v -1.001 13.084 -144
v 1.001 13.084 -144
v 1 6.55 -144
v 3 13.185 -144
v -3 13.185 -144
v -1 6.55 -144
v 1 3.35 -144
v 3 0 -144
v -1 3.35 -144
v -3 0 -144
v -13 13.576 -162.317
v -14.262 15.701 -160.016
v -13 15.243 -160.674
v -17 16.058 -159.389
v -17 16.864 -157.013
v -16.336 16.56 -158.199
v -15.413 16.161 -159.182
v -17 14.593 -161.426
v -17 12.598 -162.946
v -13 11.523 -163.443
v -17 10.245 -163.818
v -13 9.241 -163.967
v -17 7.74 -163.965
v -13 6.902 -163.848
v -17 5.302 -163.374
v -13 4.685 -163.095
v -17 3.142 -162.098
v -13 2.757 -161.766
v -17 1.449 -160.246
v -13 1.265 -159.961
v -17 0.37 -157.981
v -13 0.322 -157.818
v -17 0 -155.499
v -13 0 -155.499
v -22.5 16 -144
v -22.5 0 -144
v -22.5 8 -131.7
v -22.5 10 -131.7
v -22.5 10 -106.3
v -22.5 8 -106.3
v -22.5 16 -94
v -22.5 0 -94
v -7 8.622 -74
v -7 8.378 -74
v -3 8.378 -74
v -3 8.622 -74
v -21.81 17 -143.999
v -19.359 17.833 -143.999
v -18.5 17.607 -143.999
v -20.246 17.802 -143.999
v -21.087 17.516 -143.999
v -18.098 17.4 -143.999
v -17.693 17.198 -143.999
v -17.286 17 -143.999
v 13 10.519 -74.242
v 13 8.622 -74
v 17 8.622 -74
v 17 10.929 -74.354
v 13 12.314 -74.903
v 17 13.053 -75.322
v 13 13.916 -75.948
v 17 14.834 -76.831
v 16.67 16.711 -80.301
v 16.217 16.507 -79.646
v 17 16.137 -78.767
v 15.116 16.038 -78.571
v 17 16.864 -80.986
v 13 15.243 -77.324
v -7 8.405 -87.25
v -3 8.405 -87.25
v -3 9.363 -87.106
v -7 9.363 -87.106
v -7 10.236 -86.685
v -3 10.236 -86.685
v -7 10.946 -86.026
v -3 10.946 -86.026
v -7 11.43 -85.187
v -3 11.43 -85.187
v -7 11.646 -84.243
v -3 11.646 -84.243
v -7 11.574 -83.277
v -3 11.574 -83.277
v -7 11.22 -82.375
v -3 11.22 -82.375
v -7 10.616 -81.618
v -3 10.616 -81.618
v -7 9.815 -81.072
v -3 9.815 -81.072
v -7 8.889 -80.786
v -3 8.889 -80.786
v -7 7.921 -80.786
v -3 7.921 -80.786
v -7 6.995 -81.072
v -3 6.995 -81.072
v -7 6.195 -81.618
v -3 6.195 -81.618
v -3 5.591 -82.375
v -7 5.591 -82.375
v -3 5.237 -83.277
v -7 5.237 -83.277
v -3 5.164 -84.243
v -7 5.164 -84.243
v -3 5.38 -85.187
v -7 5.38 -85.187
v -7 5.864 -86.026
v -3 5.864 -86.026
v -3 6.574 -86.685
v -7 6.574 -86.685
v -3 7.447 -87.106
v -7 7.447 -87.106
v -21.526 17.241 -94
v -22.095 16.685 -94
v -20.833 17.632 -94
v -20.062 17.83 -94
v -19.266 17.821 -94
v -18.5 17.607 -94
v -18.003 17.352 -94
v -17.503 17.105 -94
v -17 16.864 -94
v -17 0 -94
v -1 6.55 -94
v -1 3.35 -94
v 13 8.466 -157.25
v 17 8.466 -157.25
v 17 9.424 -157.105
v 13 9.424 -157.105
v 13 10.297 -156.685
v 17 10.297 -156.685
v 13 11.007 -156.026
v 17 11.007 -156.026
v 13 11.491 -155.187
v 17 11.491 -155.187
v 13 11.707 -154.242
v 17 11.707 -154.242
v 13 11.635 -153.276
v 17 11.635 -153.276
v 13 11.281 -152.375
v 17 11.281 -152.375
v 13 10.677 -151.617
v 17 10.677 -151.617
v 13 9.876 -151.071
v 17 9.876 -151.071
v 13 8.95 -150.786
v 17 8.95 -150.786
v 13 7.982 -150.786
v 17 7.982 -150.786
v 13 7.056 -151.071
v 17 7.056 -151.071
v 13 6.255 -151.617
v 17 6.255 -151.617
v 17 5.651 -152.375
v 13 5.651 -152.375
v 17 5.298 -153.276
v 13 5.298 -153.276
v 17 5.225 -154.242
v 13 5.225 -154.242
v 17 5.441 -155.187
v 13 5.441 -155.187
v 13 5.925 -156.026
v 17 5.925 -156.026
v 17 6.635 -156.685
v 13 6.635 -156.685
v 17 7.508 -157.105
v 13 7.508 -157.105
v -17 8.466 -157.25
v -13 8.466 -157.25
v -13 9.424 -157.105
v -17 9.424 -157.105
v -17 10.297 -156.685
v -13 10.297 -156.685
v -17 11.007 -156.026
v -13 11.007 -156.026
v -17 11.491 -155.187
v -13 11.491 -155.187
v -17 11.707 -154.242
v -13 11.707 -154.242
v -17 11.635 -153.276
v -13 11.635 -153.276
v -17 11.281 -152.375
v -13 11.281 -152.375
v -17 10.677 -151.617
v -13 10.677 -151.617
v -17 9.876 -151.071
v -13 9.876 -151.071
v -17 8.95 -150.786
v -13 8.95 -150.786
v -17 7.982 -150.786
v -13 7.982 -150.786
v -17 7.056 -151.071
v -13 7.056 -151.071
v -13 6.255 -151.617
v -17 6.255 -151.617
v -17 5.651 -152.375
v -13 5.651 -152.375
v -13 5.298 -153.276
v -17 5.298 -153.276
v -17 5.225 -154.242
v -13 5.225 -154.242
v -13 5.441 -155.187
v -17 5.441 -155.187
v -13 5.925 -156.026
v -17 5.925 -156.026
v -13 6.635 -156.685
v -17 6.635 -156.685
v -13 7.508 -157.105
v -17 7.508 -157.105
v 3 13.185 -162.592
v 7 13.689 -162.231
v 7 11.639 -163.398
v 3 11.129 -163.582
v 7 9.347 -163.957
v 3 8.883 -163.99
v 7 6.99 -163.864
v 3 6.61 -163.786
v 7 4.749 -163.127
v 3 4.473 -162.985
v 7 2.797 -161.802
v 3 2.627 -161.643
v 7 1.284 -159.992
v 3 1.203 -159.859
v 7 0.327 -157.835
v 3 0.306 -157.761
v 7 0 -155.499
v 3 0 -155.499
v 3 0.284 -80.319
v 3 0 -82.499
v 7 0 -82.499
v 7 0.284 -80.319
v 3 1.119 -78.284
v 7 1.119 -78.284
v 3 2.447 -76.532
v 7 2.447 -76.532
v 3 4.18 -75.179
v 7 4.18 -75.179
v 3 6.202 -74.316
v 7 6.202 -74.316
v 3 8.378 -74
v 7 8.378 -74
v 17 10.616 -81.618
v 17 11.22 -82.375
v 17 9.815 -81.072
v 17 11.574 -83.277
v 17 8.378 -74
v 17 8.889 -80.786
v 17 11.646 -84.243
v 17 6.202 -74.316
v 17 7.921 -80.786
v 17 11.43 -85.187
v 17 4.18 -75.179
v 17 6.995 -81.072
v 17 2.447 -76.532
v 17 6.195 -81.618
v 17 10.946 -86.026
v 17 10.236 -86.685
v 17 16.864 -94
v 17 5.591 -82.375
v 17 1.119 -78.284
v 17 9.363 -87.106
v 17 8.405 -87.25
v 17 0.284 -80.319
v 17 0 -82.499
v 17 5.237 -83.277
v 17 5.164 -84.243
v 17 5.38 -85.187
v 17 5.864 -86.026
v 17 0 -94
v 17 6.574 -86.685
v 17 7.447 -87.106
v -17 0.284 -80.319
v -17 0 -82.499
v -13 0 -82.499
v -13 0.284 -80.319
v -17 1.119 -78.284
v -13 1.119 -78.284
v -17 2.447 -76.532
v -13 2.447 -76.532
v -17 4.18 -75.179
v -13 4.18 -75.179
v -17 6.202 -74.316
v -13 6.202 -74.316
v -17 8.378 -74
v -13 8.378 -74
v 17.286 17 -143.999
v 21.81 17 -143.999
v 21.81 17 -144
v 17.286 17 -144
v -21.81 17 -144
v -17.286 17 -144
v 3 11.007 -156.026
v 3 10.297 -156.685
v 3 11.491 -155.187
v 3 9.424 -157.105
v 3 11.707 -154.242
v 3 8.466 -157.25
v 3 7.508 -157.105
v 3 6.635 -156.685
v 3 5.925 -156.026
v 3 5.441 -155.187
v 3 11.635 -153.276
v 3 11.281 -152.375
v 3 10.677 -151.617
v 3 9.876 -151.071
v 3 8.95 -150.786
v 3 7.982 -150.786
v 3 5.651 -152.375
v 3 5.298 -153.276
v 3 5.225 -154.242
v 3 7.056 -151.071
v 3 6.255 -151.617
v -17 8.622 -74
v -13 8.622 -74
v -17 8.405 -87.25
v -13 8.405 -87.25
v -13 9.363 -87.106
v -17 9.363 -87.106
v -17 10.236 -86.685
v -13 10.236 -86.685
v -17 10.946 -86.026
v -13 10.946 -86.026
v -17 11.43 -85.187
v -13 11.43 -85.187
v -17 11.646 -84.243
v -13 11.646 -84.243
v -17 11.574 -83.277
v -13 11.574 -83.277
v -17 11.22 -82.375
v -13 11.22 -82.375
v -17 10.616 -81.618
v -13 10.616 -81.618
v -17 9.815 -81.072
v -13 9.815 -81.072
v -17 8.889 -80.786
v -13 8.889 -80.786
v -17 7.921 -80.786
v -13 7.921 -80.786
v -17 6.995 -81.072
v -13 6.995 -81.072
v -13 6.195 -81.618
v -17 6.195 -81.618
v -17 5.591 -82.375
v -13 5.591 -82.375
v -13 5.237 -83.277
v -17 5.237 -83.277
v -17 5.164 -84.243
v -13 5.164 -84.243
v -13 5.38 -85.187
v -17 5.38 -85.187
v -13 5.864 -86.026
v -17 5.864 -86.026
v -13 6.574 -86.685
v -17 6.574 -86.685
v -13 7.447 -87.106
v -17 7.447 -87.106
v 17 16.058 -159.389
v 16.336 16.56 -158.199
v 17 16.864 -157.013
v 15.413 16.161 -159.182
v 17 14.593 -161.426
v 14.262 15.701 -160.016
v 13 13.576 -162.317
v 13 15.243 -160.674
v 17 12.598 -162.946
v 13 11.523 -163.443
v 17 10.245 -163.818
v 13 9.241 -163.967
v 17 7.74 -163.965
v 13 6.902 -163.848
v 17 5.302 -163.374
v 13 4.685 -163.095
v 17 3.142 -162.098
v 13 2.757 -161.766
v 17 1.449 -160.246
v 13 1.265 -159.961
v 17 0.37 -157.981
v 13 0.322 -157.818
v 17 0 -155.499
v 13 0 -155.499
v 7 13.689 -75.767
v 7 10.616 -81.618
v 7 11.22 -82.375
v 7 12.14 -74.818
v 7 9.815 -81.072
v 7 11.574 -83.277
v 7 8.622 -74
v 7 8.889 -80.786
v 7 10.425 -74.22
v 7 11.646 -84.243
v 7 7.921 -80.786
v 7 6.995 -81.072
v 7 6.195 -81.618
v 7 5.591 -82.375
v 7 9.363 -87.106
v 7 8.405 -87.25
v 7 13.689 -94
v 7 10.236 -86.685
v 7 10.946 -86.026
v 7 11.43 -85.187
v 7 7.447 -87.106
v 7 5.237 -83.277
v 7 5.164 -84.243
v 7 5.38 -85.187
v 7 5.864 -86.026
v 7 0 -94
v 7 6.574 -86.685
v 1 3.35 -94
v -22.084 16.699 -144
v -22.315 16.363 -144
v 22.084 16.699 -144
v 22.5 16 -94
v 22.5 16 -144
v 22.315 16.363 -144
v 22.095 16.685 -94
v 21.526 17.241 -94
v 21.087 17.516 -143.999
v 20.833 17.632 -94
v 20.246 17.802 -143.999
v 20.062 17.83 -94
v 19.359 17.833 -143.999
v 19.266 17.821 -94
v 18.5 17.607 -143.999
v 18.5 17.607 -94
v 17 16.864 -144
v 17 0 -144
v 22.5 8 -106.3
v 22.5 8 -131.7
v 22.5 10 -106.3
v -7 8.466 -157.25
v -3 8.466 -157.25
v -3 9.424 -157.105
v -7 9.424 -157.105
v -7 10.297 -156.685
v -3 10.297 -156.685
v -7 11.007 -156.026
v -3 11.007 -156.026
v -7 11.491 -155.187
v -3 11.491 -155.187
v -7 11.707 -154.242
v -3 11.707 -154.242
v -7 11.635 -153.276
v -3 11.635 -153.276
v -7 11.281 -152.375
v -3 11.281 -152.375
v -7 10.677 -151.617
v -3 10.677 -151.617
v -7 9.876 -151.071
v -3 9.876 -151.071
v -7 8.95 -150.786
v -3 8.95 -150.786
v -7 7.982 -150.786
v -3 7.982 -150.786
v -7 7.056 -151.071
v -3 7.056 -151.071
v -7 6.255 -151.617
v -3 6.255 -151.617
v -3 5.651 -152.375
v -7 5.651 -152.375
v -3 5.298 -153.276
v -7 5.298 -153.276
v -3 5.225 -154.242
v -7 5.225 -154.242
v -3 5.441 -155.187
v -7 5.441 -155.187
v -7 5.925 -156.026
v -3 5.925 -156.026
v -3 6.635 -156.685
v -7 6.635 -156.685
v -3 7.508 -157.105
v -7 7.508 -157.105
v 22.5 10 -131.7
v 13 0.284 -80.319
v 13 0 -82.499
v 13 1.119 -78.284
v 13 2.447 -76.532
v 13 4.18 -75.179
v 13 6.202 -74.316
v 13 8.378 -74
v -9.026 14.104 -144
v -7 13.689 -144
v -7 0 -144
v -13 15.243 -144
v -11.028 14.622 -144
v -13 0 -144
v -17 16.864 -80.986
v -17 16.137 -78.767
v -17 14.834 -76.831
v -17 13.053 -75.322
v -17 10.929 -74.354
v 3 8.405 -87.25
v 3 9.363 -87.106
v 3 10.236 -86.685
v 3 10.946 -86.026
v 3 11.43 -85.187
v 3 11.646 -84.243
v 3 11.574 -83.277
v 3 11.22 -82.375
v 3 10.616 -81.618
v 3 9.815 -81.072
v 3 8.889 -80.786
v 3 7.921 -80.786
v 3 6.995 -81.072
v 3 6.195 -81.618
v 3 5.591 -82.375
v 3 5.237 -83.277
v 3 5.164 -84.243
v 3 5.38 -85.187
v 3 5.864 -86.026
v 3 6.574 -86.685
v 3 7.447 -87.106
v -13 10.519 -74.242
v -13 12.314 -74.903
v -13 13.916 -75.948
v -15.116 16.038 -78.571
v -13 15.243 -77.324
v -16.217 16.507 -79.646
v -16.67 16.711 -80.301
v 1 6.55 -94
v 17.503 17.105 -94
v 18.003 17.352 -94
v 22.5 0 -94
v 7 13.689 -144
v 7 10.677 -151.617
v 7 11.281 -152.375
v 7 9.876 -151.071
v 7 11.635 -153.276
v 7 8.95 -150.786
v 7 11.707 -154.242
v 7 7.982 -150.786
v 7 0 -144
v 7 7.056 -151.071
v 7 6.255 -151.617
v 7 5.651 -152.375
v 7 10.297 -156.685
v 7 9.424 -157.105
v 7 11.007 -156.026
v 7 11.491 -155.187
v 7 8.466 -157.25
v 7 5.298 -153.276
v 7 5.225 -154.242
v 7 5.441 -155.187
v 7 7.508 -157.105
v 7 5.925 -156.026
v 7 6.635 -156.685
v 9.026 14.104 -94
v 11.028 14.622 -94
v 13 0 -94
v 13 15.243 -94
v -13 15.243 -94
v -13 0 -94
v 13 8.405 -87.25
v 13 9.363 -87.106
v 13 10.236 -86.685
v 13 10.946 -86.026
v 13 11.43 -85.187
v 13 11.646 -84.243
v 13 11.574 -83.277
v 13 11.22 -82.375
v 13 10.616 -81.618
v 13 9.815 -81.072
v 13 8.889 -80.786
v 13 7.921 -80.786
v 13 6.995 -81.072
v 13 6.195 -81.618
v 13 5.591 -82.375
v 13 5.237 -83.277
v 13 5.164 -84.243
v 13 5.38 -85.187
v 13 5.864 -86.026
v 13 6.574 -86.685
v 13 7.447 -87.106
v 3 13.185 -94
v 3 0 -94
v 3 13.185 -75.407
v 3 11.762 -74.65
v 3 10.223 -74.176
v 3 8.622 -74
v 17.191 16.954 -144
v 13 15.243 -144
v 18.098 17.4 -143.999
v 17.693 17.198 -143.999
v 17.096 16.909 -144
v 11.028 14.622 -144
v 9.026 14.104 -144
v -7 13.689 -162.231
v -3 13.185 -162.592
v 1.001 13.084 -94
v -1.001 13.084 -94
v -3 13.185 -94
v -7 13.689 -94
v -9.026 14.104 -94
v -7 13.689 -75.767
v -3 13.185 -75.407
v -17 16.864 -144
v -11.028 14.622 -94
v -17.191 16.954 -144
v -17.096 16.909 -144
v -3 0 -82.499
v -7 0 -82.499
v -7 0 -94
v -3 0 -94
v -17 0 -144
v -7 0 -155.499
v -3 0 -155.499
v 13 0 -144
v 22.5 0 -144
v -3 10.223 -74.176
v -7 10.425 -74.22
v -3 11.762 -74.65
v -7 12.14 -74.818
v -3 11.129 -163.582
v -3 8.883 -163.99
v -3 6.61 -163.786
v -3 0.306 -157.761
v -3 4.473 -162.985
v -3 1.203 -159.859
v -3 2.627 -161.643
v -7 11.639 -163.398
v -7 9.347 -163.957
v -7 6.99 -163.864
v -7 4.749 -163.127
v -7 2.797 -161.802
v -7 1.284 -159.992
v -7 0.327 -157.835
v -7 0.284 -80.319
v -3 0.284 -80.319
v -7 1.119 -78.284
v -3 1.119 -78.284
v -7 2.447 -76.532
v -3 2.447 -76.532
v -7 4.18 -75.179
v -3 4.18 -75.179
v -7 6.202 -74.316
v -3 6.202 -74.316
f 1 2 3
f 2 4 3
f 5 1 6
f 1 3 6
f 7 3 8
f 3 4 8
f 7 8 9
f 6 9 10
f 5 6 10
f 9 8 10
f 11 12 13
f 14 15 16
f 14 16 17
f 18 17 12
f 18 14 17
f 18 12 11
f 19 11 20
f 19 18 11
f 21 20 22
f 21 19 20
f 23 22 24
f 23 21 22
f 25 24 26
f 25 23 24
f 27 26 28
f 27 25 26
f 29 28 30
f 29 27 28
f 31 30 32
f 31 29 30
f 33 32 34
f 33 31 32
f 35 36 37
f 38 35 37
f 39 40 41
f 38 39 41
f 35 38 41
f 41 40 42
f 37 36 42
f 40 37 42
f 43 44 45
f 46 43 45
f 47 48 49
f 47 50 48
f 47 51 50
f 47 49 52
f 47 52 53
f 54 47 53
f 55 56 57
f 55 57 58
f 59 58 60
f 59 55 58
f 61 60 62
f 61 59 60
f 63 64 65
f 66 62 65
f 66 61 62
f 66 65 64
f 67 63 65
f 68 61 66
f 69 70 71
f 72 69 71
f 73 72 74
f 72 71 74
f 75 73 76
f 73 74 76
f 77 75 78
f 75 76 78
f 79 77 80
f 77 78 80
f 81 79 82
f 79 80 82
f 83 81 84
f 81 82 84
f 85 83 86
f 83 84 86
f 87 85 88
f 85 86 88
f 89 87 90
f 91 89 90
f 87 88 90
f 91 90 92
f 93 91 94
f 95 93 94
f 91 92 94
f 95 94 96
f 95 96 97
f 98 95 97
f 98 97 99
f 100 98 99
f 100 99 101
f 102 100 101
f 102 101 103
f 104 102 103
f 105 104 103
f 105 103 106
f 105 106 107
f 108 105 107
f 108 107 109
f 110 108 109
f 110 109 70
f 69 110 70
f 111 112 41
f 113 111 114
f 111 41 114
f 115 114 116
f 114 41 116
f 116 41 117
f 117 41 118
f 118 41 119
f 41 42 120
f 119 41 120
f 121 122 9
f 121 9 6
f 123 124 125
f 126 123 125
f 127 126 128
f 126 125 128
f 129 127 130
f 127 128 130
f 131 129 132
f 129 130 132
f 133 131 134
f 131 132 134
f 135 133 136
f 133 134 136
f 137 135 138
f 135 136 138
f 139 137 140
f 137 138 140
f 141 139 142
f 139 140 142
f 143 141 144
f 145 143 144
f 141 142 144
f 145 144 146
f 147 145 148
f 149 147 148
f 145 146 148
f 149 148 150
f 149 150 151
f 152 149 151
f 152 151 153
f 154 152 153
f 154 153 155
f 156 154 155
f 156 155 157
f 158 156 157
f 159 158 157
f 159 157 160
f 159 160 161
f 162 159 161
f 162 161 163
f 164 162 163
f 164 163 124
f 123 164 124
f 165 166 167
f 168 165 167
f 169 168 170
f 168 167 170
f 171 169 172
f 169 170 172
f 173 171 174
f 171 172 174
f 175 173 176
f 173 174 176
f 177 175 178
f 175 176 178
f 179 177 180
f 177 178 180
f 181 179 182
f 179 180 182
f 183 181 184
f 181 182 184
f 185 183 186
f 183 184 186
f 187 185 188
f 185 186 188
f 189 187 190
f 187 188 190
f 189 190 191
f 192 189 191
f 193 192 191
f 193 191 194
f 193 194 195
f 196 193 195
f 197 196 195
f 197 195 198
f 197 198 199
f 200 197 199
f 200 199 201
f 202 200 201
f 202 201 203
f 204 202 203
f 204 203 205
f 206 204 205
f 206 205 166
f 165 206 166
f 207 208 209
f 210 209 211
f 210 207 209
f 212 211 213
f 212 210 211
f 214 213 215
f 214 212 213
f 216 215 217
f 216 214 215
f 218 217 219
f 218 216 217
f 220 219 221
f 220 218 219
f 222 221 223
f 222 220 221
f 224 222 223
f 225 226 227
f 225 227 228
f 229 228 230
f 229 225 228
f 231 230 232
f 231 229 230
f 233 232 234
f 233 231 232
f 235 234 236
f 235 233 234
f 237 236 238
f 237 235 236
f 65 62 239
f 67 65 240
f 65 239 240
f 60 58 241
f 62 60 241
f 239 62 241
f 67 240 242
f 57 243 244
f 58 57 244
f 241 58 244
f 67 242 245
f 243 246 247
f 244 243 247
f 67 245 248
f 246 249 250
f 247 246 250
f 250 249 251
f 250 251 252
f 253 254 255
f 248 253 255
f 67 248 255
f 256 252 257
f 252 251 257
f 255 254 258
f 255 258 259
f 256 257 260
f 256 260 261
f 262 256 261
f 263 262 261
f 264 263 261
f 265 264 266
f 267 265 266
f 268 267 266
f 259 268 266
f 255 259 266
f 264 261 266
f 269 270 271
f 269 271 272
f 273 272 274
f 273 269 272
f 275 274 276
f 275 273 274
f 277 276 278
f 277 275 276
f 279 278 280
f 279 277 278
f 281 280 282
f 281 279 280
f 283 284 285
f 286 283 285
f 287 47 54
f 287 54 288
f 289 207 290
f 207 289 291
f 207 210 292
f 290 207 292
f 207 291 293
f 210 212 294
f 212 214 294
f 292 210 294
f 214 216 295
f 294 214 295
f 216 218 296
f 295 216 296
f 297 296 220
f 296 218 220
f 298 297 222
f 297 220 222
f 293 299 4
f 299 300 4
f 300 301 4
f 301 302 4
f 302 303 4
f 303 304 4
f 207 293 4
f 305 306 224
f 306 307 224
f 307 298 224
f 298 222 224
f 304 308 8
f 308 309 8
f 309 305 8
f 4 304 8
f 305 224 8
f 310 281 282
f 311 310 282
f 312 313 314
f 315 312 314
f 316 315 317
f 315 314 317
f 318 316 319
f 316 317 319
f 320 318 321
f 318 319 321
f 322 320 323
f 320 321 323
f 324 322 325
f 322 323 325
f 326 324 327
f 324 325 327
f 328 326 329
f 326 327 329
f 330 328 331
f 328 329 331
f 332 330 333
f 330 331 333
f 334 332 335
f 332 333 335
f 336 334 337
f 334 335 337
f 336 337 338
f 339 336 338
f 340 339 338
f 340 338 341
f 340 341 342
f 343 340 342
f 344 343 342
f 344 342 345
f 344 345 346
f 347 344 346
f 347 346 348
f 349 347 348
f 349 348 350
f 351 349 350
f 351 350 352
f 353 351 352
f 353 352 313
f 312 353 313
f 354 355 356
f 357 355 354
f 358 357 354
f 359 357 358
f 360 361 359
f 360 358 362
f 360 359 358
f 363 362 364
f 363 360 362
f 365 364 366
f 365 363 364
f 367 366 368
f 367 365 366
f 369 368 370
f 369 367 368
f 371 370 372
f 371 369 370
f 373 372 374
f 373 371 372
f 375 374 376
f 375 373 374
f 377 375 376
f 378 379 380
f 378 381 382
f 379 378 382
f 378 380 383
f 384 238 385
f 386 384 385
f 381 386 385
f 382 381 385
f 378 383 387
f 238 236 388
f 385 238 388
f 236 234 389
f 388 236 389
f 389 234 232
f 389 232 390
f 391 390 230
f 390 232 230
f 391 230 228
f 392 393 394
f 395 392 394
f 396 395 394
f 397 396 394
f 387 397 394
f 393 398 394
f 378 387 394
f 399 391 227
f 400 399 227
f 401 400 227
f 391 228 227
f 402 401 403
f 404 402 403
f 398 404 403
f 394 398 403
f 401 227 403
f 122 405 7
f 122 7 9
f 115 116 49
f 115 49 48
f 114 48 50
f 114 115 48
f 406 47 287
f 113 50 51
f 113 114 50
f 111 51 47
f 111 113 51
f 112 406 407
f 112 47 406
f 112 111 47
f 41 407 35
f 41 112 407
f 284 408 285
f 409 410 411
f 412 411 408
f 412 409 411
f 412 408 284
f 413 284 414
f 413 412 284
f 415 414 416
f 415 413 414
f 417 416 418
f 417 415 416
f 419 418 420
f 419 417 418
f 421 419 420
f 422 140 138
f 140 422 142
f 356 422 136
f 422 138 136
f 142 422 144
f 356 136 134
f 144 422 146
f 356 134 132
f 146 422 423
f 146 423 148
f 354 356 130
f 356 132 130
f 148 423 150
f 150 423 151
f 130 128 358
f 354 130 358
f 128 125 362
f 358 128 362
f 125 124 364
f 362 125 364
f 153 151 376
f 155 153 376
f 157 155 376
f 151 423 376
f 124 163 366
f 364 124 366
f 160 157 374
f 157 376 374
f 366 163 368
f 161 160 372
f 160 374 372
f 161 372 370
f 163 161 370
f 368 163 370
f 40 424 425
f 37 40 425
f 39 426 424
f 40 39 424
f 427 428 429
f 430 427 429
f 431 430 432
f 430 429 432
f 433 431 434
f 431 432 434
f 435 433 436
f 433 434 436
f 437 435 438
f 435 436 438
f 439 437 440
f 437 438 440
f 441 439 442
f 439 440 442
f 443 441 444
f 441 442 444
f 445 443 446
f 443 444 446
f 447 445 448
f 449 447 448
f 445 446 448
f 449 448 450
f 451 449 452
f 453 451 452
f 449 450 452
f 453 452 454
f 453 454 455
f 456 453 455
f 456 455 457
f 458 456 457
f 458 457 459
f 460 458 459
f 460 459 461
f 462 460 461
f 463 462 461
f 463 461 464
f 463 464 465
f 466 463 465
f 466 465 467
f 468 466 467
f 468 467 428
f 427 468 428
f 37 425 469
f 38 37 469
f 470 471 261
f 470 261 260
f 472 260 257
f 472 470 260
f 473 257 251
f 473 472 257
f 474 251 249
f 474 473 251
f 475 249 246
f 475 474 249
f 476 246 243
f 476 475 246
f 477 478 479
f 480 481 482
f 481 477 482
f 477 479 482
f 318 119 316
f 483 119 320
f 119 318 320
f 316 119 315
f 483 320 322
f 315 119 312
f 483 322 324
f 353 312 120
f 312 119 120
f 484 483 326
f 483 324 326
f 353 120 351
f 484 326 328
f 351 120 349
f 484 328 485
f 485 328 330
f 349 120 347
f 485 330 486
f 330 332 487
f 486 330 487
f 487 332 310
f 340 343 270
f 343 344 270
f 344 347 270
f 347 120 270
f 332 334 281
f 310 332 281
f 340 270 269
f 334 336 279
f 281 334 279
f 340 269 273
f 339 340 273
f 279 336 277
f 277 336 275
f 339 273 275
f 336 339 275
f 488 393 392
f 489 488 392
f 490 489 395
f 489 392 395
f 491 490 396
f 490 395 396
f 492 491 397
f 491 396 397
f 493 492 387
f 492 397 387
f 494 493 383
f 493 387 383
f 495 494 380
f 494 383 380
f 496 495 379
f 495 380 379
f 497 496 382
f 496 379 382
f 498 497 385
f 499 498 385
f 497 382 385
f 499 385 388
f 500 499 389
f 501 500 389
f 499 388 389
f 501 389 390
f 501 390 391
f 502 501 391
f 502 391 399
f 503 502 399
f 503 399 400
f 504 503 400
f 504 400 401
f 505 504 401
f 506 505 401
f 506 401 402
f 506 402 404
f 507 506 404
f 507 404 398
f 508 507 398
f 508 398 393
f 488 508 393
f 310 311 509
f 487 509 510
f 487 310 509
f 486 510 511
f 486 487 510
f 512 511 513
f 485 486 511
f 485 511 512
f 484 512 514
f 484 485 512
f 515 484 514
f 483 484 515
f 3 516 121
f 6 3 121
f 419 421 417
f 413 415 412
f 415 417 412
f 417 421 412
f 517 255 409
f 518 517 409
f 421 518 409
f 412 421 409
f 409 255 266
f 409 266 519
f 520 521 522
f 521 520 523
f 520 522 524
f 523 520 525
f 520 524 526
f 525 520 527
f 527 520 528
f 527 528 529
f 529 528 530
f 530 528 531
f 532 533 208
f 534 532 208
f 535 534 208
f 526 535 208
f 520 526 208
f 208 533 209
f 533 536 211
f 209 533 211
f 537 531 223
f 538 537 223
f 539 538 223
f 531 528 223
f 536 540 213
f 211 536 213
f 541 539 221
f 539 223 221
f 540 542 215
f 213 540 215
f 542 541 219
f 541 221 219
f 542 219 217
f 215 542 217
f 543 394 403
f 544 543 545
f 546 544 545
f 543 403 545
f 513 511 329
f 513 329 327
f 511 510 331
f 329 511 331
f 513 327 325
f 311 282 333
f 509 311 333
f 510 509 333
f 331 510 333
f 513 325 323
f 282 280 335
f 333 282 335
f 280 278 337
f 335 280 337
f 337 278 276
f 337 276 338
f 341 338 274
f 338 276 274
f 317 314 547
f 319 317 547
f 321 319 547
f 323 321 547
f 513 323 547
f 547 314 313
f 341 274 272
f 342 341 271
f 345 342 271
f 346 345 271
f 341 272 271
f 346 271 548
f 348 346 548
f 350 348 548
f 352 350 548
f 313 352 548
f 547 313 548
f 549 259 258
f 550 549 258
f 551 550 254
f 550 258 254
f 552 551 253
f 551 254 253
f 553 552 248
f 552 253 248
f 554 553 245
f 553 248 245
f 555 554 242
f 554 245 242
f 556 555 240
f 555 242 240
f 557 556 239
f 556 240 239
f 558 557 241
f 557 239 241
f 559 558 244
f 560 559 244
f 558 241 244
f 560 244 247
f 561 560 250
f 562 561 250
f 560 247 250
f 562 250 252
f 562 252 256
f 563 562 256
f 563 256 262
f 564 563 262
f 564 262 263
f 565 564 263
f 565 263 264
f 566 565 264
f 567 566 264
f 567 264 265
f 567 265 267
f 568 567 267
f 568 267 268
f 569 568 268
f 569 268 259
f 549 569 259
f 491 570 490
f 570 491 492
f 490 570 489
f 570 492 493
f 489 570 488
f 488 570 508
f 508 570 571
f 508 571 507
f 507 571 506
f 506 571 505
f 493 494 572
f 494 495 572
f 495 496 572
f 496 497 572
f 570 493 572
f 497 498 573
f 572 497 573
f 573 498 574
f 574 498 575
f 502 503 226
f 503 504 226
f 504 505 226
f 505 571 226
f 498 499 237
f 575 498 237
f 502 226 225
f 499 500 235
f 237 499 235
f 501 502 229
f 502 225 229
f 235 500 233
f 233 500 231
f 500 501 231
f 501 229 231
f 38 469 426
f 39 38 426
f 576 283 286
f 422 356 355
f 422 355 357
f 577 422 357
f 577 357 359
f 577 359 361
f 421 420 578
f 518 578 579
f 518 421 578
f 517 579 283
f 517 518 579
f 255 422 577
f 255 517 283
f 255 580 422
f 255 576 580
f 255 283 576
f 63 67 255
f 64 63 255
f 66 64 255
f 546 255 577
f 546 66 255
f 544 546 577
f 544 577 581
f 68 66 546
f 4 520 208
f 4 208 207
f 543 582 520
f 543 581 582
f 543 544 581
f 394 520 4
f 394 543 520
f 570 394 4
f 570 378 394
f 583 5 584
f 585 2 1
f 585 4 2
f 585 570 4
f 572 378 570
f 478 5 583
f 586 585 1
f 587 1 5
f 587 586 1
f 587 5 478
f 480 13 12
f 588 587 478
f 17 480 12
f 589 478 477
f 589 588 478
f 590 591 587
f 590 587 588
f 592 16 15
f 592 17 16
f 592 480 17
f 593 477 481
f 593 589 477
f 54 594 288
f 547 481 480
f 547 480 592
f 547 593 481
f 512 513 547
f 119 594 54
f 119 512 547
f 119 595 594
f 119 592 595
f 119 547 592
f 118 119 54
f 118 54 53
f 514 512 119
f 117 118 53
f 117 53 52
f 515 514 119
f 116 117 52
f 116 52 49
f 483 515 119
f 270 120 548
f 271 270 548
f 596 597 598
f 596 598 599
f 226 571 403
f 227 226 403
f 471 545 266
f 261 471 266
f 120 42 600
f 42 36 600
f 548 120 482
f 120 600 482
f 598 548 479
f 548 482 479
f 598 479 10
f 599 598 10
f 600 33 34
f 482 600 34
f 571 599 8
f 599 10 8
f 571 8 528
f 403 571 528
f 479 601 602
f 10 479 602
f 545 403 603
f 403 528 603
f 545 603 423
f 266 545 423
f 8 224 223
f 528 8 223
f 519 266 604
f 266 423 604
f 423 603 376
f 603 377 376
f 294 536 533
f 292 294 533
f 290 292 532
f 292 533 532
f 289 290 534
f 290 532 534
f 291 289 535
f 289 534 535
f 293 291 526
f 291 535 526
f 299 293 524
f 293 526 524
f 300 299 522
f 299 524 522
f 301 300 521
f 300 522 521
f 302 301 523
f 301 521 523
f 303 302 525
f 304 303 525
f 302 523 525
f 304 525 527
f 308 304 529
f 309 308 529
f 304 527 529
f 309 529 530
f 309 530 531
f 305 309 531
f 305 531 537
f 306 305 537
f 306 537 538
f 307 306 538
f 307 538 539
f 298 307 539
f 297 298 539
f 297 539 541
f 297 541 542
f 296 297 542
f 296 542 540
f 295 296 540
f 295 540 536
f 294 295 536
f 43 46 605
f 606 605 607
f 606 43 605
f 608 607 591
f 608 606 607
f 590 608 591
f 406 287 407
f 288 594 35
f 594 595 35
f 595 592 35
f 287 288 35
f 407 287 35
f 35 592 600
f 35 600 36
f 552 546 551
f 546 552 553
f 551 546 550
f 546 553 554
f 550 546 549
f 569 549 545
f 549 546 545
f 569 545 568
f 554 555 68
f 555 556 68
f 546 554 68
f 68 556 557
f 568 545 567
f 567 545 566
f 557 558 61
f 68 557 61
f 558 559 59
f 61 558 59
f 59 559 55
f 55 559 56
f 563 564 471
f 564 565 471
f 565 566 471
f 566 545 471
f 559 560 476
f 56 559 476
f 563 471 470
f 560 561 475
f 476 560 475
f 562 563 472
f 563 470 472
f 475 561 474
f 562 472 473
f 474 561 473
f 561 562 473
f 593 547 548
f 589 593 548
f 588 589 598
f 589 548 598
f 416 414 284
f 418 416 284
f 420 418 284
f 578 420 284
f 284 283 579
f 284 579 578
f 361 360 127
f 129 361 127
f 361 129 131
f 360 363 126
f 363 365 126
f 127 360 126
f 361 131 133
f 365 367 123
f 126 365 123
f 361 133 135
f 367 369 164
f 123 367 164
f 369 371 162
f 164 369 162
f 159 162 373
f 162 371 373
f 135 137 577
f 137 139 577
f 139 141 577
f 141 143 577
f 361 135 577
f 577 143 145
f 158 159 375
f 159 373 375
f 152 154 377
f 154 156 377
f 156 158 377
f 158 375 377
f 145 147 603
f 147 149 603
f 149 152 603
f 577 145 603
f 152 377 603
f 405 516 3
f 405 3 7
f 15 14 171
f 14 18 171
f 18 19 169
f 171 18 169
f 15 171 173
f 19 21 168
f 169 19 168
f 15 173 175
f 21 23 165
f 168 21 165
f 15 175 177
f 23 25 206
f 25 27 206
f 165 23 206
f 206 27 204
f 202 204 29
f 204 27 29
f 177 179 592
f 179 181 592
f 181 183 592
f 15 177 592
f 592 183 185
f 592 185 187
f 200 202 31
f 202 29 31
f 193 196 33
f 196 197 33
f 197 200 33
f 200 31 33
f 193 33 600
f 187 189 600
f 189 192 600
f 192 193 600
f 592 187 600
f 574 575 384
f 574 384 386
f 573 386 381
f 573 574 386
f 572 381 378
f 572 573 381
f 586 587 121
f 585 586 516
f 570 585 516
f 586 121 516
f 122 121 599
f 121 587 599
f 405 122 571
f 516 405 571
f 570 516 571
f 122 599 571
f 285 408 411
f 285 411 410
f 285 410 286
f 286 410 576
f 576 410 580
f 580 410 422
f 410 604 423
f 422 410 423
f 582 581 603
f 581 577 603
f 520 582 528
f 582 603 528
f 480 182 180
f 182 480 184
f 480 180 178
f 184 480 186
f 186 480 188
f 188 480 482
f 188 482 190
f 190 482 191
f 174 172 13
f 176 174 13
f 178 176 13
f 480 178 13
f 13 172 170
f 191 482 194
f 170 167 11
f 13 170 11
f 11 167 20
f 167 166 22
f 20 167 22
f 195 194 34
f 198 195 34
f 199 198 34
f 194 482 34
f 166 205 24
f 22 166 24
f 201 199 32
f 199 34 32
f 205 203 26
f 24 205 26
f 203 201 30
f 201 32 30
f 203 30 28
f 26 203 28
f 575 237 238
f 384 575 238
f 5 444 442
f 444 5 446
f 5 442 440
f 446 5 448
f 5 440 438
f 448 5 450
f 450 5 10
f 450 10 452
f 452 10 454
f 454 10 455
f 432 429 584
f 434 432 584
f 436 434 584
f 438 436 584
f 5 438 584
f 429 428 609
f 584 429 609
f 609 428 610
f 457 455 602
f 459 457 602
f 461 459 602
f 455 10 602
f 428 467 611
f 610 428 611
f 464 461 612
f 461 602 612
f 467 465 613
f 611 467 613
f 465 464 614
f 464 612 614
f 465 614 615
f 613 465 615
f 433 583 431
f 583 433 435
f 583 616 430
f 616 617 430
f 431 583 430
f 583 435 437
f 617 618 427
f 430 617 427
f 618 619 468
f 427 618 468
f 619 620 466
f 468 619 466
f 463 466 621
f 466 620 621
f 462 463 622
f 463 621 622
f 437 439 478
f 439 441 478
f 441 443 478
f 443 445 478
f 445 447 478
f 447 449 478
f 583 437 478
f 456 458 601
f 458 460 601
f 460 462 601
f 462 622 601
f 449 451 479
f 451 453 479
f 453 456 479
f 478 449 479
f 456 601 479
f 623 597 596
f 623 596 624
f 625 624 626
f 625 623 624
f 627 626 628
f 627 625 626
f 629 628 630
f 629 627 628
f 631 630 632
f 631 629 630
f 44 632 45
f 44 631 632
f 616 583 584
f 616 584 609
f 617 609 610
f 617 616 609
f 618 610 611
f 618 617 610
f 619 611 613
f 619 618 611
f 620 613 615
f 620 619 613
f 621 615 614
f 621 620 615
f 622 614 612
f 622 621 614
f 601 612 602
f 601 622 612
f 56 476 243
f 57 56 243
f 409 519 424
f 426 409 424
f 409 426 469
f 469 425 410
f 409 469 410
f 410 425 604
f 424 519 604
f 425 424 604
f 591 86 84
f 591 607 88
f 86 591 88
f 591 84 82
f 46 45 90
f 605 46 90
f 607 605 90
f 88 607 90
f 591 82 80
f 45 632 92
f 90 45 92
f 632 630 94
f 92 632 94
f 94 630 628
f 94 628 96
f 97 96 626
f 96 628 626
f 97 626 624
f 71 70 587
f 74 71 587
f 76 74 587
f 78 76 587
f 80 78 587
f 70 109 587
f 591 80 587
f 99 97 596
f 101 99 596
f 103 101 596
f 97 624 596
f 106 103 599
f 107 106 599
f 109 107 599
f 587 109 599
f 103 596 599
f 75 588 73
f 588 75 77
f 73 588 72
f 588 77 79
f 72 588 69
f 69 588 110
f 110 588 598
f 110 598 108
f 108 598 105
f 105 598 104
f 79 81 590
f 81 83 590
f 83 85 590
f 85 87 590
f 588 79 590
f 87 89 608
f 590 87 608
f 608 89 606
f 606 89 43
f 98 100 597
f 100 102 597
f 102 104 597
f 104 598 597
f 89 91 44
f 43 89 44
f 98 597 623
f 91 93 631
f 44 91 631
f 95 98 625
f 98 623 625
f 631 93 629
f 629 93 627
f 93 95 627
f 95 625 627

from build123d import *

# Parameters (mm, degrees)
BOSS_EXTRUDE1_DEPTH = 20
CUT_EXTRUDE21_DEPTH = 45
CUT_EXTRUDE23_DEPTH = 444
SKETCH9_R           = 3.25
SKETCH9_R_2         = 3.15
CUT_EXTRUDE24_DEPTH = 45
CUT_EXTRUDE26_DEPTH = 444
CUT_EXTRUDE27_DEPTH = 45


with BuildPart() as part:
    # Sketch1 → Boss-Extrude1 (new body)
    with BuildSketch(Plane(origin=(0, 0, 0), x_dir=(1, 0, 0), z_dir=(0, 1, 0))):
        Polygon((-17, 94), (-17, 74), (-15, 74), (-13, 74), (-13, 94), (-12.5, 94), (-7.5, 94), (-7, 94), (-7, 74), (-5, 74), (-3, 74), (-3, 94), (-2.5, 94), (2.5, 94), (3, 94), (3, 74), (5, 74), (7, 74), (7, 94), (7.5, 94), (12.5, 94), (13, 94), (13, 74), (17, 74), (17, 94), (17.5, 94), (22.5, 94), (22.5, 144), (17.5, 144), (17, 144), (17, 164), (15, 164), (13, 164), (13, 144), (12.5, 144), (7.5, 144), (7, 144), (7, 164), (5, 164), (3, 164), (3, 144), (2.5, 144), (-2.5, 144), (-3, 144), (-3, 164), (-5, 164), (-7, 164), (-7, 144), (-7.5, 144), (-12.5, 144), (-13, 144), (-13, 164), (-15, 164), (-17, 164), (-17, 144), (-17.5, 144), (-22.5, 144), (-22.5, 94), (-17.5, 94), align=None)
    extrude(amount=BOSS_EXTRUDE1_DEPTH)

    # Sketch7 → Cut-Extrude21 (cut)
    with BuildSketch(Plane(origin=(22.5, 0, 0), x_dir=(0, 0, -1), z_dir=(1, 0, 0))):
        with BuildLine():
            ThreePointArc((73.999126156, 8.5), (76.488718516, 14.51040764), (82.499126156, 17))
            Line((82.499126156, 17), (93.999126156, 17))
            Line((93.999126156, 17), (93.999126156, 20))
            Line((93.999126156, 20), (73.999126156, 20))
            Line((73.999126156, 20), (73.999126156, 8.5))
        make_face()
        with BuildLine():
            ThreePointArc((82.499126156, 0), (76.488718516, 2.48959236), (73.999126156, 8.5))
            Line((73.999126156, 8.5), (73.999126156, 0))
            Line((73.999126156, 0), (82.499126156, 0))
        make_face()
        with BuildLine():
            ThreePointArc((155.499126156, 17), (163.999126156, 8.5), (155.499126156, 0))
            Line((155.499126156, 0), (164.814039075, 0))
            Line((164.814039075, 0), (164.814039075, 20))
            Line((164.814039075, 20), (143.999126156, 20))
            Line((143.999126156, 20), (143.999126156, 17))
            Line((143.999126156, 17), (155.499126156, 17))
        make_face()
    extrude(amount=-CUT_EXTRUDE21_DEPTH, mode=Mode.SUBTRACT)

    # Sketch2 → Cut-Extrude23 (cut)
    with BuildSketch(Plane.XY.offset(50)):
        with BuildLine():
            Line((-22.5, 20), (22.5, 20))
            Line((22.5, 20), (22.5, 16))
            ThreePointArc((22.5, 16), (20.832845478, 17.631987193), (18.5, 17.607120136))
            ThreePointArc((18.5, 17.607120136), (0, 13.071891388), (-18.5, 17.607120136))
            ThreePointArc((-18.5, 17.607120136), (-20.832845478, 17.631987193), (-22.5, 16))
            Line((-22.5, 16), (-22.5, 20))
        make_face()
    extrude(amount=-CUT_EXTRUDE23_DEPTH, mode=Mode.SUBTRACT)

    # Sketch9 → Cut-Extrude24 (cut)
    with BuildSketch(Plane(origin=(22.5, 0, 0), x_dir=(0, 0, -1), z_dir=(1, 0, 0))):
        with Locations((153.999563078, 8.466039352)):
            Circle(SKETCH9_R)
        with Locations((84, 8.405099657)):
            Circle(SKETCH9_R)
        with Locations((178, 8.5)):
            Circle(SKETCH9_R_2)
        with Locations((60, 8.5)):
            Circle(SKETCH9_R_2)
    extrude(amount=-CUT_EXTRUDE24_DEPTH, mode=Mode.SUBTRACT)

    # Sketch12 → Cut-Extrude26 (cut)
    with BuildSketch(Plane.XY.offset(50)):
        Polygon((-1, 3.35), (-1, 6.55), (0, 6.55), (1, 6.55), (1, 3.35), align=None)
    extrude(amount=-CUT_EXTRUDE26_DEPTH, mode=Mode.SUBTRACT)

    # Sketch13 → Cut-Extrude27 (cut)
    with BuildSketch(Plane(origin=(22.5, 0, 0), x_dir=(0, 0, -1), z_dir=(1, 0, 0))):
        Polygon((119, 8), (131.7, 8), (131.7, 10), (106.3, 10), (106.3, 8), align=None)
    extrude(amount=-CUT_EXTRUDE27_DEPTH, mode=Mode.SUBTRACT)


solid = part.part
